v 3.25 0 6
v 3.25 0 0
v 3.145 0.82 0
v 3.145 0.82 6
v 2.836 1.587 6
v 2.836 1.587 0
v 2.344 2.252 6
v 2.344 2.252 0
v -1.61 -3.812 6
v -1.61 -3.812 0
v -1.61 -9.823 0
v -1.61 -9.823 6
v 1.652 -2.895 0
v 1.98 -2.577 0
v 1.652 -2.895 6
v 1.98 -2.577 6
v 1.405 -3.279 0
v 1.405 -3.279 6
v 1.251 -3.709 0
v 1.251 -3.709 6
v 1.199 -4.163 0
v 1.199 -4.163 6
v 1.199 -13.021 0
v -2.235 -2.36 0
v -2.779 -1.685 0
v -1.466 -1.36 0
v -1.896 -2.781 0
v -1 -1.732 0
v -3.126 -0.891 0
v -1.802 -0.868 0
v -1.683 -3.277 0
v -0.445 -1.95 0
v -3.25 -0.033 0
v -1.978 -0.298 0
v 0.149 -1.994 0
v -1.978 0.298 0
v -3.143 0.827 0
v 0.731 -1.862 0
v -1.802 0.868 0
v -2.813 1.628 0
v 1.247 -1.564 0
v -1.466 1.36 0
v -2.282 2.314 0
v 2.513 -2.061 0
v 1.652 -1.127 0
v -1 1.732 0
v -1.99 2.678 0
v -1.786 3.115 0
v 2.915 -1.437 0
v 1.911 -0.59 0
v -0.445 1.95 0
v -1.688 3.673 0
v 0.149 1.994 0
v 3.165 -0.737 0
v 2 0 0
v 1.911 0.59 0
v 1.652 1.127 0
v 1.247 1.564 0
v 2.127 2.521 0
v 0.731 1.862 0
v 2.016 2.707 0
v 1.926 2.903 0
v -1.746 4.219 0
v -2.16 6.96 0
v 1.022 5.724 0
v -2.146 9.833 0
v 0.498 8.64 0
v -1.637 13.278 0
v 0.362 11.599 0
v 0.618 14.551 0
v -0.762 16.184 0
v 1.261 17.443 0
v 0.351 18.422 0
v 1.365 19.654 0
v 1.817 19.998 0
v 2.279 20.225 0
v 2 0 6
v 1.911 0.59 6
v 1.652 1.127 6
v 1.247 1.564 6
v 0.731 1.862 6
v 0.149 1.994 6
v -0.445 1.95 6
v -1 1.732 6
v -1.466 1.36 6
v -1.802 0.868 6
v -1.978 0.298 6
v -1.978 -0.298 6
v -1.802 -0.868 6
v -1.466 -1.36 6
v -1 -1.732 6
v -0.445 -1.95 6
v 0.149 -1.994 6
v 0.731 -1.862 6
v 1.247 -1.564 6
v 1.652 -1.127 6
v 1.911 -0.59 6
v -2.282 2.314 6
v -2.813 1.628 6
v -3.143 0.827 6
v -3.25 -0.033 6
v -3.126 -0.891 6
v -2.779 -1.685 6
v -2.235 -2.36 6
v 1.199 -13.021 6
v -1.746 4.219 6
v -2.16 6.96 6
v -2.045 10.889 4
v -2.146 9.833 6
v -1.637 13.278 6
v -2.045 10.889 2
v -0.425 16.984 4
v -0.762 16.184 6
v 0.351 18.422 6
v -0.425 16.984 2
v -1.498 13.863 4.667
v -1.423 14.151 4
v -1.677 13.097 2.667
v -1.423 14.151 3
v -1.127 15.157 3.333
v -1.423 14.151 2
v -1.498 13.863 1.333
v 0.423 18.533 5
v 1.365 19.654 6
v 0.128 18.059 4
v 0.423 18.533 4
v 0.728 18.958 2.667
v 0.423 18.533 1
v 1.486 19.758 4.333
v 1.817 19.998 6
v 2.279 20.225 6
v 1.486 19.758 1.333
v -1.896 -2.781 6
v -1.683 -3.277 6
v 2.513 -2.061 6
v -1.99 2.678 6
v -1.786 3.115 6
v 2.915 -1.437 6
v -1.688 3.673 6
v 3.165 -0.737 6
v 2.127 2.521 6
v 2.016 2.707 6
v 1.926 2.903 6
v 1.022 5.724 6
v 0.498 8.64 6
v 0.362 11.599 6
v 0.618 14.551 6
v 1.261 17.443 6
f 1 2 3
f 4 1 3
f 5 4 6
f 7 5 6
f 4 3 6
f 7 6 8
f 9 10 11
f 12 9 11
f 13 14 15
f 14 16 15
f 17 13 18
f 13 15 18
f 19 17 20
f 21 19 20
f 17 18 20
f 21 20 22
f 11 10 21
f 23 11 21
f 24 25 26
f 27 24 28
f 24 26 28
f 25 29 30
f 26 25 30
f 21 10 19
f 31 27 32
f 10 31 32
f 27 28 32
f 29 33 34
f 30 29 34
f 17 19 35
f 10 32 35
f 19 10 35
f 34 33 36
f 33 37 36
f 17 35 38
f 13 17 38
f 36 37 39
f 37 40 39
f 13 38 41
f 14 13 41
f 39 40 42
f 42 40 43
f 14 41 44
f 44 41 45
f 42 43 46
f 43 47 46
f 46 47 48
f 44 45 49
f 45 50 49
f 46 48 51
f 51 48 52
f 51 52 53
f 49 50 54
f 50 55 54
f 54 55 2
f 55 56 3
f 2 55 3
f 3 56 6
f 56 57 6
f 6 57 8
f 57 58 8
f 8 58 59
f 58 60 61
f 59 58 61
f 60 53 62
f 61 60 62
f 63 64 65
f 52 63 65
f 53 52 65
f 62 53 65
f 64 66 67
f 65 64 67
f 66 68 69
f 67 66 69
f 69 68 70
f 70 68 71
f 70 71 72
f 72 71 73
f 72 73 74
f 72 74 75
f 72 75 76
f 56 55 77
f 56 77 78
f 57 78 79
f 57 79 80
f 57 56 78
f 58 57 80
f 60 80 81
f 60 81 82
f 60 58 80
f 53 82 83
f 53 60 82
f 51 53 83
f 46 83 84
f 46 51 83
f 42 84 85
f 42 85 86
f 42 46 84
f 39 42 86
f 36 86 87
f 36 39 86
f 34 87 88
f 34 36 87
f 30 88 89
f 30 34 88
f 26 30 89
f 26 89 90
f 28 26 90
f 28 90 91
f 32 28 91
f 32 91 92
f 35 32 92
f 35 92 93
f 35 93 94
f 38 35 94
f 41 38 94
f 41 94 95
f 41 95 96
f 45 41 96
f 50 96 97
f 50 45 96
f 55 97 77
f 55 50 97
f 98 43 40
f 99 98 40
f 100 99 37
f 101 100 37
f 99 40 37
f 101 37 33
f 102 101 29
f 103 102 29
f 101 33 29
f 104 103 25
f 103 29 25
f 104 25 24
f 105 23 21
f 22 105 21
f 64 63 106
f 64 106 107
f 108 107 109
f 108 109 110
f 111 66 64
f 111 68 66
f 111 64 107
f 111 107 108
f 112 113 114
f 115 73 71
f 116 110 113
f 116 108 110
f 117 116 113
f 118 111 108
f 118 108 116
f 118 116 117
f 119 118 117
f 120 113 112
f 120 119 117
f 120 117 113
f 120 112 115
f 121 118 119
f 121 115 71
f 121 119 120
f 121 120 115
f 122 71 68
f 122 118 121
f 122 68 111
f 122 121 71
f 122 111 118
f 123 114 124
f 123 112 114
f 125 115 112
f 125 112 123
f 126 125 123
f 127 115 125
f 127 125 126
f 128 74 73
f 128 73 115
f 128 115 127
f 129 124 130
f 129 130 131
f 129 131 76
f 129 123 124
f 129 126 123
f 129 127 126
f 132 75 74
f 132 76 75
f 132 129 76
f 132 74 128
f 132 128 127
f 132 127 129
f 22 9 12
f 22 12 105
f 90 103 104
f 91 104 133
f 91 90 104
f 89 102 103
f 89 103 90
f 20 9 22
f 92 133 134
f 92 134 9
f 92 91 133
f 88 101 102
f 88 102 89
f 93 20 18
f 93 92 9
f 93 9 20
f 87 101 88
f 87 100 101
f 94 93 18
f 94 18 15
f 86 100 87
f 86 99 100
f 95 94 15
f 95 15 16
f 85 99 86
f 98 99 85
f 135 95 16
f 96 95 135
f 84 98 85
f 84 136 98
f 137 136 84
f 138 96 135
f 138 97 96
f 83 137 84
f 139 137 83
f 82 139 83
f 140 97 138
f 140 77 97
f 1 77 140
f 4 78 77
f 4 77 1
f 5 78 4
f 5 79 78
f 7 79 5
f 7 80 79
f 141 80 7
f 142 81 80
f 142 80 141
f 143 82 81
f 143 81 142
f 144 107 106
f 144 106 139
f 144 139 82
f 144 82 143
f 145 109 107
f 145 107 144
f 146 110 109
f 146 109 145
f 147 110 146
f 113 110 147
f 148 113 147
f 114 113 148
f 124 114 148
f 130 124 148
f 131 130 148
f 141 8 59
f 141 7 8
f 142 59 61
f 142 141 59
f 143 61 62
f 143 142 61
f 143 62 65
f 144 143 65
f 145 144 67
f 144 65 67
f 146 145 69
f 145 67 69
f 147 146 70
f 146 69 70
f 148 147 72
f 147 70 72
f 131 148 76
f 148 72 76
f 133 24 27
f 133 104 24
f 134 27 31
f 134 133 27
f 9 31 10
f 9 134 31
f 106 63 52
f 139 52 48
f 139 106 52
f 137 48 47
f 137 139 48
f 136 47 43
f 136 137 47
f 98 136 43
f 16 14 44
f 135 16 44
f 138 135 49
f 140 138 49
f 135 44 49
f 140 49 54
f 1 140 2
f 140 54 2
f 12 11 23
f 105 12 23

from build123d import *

# Parameters (mm, degrees)
F0_R     = 2
F1_DEPTH = 6
F2_R     = 2


# Not quite as in the source:
# - a feature names something its author has since deleted; it is built from what else it names


with BuildPart() as f1:
    # F0 (on Top) → F1 (new body)
    with BuildSketch(Plane.XY):
        with BuildLine():
            ThreePointArc((1.1986346156, -3.0208897792), (2.688685785, -1.8257789432), (3.25, 0))
            ThreePointArc((3.25, 0), (2.9473803034, 1.3694704624), (2.0958773247, 2.4839078565))
            ThreePointArc((2.0958773247, 2.4839078565), (0.4368938689, 3.220500543), (-1.3583713088, 2.952512047))
            ThreePointArc((-1.3583713088, 2.952512047), (-3.2469183887, 0.1414955013), (-1.6100655086, -2.8231523264))
            ThreePointArc((-1.6100655086, -2.8231523264), (-0.2282408158, -3.2419756523), (1.1986346156, -3.0208897792))
        make_face()
        Circle(F0_R, mode=Mode.SUBTRACT)
        with BuildLine():
            Line((1.1986346156, -13.0208897792), (1.1986346156, -3.0208897792))
            ThreePointArc((1.1986346156, -3.0208897792), (-0.2282408158, -3.2419756523), (-1.6100655086, -2.8231523264))
            Line((-1.6100655086, -2.8231523264), (-1.6100655086, -9.8231523264))
            Line((-1.6100655086, -9.8231523264), (1.1986346156, -13.0208897792))
        make_face()
        with BuildLine():
            ThreePointArc((-1.3583713088, 2.952512047), (0.4368938689, 3.220500543), (2.0958773247, 2.4839078565))
            ThreePointArc((2.0958773247, 2.4839078565), (0.3587431794, 11.3732693794), (2.2789172363, 20.2248971909))
            add(Edge.make_bspline(
                [(-1.3583713088, 2.952512047), (-3.6481465213, 9.1469325125), (-0.8962951833, 19.0959330648), (2.2789172363, 20.2248971909)],
                knots=[0, 0, 0, 0, 17.6512083587, 17.6512083587, 17.6512083587, 17.6512083587], degree=3))
        make_face()
    extrude(amount=F1_DEPTH)

    # F2
    f2_edges = [f1.edges().sort_by_distance(p)[0] for p in [
        (-1.610066, -2.823152, 3),
        (1.198635, -3.02089, 3),
        (-1.358371, 2.952512, 3),
        (2.095877, 2.483908, 3),
    ]]
    fillet(f2_edges, radius=F2_R)


solid = f1.part
